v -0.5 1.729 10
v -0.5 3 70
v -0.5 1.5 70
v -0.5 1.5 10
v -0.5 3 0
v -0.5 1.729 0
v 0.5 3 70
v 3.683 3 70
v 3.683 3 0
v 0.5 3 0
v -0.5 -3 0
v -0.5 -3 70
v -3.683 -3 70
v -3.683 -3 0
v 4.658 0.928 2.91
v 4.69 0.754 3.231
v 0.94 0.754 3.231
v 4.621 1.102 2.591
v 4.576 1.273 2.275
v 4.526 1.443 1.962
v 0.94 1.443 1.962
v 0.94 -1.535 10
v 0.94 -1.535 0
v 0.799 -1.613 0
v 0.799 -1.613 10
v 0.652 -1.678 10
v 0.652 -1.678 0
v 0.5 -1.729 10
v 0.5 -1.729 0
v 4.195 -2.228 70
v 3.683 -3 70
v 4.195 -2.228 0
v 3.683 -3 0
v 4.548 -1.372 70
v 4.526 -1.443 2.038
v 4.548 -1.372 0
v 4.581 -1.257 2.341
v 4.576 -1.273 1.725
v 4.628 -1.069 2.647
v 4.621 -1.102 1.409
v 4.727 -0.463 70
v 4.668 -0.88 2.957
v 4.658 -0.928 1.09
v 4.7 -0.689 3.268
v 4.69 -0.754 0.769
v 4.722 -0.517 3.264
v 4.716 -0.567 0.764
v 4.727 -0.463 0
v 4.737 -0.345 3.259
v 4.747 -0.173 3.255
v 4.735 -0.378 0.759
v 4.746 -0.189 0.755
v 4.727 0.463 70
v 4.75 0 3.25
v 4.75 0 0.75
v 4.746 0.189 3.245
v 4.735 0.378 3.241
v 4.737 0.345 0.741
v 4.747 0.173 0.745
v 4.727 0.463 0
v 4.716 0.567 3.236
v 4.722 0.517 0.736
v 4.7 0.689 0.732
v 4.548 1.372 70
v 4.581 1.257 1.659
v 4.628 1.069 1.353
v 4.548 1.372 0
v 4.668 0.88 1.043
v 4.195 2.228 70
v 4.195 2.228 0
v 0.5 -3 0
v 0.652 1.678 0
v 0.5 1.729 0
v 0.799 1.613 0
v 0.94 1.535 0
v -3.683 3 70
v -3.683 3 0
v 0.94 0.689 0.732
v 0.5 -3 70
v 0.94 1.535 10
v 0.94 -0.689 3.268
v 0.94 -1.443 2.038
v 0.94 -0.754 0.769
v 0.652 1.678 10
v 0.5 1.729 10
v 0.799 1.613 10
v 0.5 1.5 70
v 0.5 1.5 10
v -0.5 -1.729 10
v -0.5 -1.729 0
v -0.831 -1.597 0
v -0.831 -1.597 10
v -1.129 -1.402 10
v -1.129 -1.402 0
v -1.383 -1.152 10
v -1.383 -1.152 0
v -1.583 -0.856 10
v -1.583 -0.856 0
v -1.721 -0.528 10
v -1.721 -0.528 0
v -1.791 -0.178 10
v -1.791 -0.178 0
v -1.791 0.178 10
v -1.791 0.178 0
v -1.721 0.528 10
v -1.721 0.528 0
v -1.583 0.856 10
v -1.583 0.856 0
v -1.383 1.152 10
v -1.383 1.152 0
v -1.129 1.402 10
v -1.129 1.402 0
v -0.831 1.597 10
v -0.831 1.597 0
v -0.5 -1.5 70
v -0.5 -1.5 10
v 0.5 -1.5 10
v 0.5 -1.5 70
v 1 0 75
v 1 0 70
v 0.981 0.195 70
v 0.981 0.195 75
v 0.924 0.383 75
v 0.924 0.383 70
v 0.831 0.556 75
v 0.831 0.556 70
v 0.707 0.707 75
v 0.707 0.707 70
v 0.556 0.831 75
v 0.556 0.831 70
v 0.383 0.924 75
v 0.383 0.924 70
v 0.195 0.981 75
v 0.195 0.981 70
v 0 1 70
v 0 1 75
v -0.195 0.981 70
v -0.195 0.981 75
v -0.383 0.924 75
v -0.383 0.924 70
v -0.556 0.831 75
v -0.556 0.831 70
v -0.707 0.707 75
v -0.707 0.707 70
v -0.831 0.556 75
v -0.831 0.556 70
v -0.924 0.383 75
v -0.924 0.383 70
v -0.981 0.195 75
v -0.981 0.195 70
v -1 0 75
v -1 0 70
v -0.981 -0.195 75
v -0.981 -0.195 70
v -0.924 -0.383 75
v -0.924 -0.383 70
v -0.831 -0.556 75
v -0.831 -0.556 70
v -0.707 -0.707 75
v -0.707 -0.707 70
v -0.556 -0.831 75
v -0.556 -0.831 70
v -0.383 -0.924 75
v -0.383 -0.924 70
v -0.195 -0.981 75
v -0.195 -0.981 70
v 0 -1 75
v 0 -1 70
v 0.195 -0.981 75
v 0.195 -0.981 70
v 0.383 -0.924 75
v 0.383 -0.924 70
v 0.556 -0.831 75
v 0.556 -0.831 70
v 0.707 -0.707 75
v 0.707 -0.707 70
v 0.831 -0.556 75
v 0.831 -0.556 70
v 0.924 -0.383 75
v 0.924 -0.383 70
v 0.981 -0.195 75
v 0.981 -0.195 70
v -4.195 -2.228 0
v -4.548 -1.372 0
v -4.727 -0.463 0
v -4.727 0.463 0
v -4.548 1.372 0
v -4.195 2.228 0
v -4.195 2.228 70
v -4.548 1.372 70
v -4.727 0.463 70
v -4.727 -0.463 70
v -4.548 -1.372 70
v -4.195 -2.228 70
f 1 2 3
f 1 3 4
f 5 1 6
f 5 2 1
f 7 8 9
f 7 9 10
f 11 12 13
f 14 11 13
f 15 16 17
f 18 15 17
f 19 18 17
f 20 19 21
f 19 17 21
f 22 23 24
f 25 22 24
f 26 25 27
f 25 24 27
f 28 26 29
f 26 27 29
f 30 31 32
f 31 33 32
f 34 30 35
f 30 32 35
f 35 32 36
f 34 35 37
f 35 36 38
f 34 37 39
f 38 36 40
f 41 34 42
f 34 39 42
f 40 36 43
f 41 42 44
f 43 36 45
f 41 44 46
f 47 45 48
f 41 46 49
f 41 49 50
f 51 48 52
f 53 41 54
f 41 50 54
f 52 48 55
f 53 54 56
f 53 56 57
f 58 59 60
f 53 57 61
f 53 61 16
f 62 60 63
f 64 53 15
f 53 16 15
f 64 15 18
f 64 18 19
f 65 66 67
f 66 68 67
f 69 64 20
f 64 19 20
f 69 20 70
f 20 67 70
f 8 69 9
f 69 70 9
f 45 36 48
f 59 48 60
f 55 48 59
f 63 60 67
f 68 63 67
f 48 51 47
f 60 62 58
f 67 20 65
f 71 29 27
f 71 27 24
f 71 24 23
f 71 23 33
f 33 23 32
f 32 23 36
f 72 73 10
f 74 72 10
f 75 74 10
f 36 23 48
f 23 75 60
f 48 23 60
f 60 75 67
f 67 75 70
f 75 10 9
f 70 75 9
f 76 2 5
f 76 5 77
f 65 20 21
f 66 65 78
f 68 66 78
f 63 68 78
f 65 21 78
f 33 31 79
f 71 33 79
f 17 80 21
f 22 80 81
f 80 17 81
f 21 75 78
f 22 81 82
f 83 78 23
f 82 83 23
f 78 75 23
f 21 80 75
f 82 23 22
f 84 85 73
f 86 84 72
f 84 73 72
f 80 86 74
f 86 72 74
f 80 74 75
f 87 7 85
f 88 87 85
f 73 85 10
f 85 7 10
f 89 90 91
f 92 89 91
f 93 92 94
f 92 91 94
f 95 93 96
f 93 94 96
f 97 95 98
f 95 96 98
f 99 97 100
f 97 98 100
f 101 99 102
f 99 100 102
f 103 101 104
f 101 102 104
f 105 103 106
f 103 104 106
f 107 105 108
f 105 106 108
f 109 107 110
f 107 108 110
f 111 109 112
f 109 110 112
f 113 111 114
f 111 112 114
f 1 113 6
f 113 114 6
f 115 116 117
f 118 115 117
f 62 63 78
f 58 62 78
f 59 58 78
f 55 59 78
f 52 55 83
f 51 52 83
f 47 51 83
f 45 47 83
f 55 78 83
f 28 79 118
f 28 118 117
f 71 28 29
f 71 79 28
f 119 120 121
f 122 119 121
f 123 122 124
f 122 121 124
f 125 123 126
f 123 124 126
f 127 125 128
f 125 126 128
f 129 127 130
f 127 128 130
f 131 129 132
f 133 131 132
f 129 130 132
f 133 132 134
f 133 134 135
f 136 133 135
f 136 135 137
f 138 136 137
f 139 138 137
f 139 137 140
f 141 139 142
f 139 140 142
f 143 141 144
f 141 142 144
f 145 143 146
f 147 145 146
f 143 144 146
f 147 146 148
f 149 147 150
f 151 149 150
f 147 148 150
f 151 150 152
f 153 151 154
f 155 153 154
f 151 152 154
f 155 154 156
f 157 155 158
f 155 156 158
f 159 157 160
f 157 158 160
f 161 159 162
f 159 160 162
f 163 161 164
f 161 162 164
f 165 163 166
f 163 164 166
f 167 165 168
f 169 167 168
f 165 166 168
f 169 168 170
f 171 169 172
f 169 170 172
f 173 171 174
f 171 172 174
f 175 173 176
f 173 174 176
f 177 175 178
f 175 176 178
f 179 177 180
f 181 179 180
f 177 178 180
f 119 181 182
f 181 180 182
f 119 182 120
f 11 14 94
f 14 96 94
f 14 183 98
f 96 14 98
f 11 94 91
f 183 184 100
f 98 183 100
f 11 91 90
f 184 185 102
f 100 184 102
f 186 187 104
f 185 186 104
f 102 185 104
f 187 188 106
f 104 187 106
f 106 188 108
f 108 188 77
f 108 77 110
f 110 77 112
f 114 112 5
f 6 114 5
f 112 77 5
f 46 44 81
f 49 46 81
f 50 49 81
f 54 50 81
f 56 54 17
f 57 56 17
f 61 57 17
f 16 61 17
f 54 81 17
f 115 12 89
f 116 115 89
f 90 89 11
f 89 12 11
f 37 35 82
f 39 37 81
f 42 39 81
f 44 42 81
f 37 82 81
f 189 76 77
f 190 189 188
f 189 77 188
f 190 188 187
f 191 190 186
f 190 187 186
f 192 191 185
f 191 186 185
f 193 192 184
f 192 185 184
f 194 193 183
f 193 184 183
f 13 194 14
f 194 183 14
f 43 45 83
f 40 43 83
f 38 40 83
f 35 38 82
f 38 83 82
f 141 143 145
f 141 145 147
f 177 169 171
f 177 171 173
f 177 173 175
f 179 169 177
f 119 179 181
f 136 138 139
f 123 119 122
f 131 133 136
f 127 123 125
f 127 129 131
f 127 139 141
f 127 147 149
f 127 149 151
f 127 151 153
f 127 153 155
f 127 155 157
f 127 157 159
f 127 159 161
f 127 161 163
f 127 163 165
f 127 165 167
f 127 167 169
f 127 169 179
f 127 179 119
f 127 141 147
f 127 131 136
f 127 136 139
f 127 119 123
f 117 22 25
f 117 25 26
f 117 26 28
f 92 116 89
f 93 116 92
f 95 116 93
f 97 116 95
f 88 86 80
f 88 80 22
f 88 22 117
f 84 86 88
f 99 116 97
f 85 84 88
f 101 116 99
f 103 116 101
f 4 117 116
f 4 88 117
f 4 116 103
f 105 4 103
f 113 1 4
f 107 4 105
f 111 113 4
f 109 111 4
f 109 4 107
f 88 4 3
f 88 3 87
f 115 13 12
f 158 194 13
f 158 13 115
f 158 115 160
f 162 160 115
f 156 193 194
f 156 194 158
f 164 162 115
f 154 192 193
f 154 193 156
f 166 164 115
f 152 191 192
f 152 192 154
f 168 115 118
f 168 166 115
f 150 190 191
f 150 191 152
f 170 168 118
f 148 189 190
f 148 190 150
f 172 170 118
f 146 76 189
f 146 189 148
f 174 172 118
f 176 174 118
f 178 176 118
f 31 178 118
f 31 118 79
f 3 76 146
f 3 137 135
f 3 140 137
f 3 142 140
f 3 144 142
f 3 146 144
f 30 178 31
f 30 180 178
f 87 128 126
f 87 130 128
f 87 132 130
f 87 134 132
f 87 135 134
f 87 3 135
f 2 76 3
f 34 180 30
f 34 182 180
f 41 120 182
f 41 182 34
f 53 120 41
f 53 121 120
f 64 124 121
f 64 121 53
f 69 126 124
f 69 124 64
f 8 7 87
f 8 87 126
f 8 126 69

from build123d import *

# Parameters (mm, degrees)
SKETCH1_R           = 4.75
BOSS_EXTRUDE1_DEPTH = 70
CUT_EXTRUDE1_DEPTH  = 10
CUT_EXTRUDE2_DEPTH  = 71.39132475
CUT_EXTRUDE3_REACH  = 72.322
SKETCH5_W           = 1
SKETCH5_H           = 70
CUT_EXTRUDE4_DEPTH  = 1.5
SKETCH6_R           = 1
BOSS_EXTRUDE2_DEPTH = 5


with BuildPart() as part:
    # Sketch1 → Boss-Extrude1 (new body)
    with BuildSketch(Plane.XY):
        Circle(SKETCH1_R)
    extrude(amount=BOSS_EXTRUDE1_DEPTH)

    # Sketch2 → Cut-Extrude1 (cut)
    with BuildSketch(Plane(origin=(0, 0, 0), x_dir=(-1, 0, 0), z_dir=(0, 0, -1))):
        with BuildLine():
            Line((-0.94, 1.535057002), (-0.94, -1.535057002))
            ThreePointArc((-0.94, -1.535057002), (1.8, 0), (-0.94, 1.535057002))
        make_face()
    extrude(amount=-CUT_EXTRUDE1_DEPTH, mode=Mode.SUBTRACT)

    # Sketch3 → Cut-Extrude2 (cut, through all)
    with BuildSketch(Plane.ZY.offset(-0.94)):
        Polygon((3.230708553, 0.754115238), (1.962271323, 1.44288249), (0.73156277, 0.688767252), (0.769291447, -0.754115238), (2.037728677, -1.44288249), (3.26843723, -0.688767252), align=None)
    extrude(amount=-CUT_EXTRUDE2_DEPTH, mode=Mode.SUBTRACT)

    # Sketch4 → Cut-Extrude3 (cut, up to next)
    with BuildSketch(Plane(origin=(0, 0, 0), x_dir=(-1, 0, 0), z_dir=(0, 0, -1)), mode=Mode.PRIVATE) as cut_extrude3_sk1:
        with BuildLine():
            Line((-3.682729966, 3), (3.682729966, 3))
            ThreePointArc((3.682729966, 3), (0, 4.75), (-3.682729966, 3))
        make_face()
    cut_extrude3_tool1 = extrude(cut_extrude3_sk1.sketch, amount=-CUT_EXTRUDE3_REACH, mode=Mode.PRIVATE) & part.part
    # Sketch4 → Cut-Extrude3 (cut, up to next)
    with BuildSketch(Plane(origin=(0, 0, 0), x_dir=(-1, 0, 0), z_dir=(0, 0, -1)), mode=Mode.PRIVATE) as cut_extrude3_sk2:
        with BuildLine():
            Line((-3.682729966, -3), (3.682729966, -3))
            ThreePointArc((3.682729966, -3), (0, -4.75), (-3.682729966, -3))
        make_face()
    cut_extrude3_tool2 = extrude(cut_extrude3_sk2.sketch, amount=-CUT_EXTRUDE3_REACH, mode=Mode.PRIVATE) & part.part
    add(cut_extrude3_tool1.solids().sort_by_distance((0, 3.712383, 0))[0], mode=Mode.SUBTRACT)
    add(cut_extrude3_tool2.solids().sort_by_distance((0, -3.712383, 0))[0], mode=Mode.SUBTRACT)

    # Sketch5 → Cut-Extrude4 (cut)
    with BuildSketch(Plane(origin=(0, 3, 0), x_dir=(1, 0, 0), z_dir=(0, 1, 0))):
        with Locations((0, -35)):
            Rectangle(SKETCH5_W, SKETCH5_H)
    cut_extrude4 = extrude(amount=-CUT_EXTRUDE4_DEPTH, mode=Mode.SUBTRACT)

    # Mirror1: Cut-Extrude4 across plane
    add(cut_extrude4.mirror(Plane.ZX), mode=Mode.SUBTRACT)

    # Sketch6 → Boss-Extrude2 (add)
    with BuildSketch(Plane.XY.offset(70)):
        Circle(SKETCH6_R)
    extrude(amount=BOSS_EXTRUDE2_DEPTH)


solid = part.part
